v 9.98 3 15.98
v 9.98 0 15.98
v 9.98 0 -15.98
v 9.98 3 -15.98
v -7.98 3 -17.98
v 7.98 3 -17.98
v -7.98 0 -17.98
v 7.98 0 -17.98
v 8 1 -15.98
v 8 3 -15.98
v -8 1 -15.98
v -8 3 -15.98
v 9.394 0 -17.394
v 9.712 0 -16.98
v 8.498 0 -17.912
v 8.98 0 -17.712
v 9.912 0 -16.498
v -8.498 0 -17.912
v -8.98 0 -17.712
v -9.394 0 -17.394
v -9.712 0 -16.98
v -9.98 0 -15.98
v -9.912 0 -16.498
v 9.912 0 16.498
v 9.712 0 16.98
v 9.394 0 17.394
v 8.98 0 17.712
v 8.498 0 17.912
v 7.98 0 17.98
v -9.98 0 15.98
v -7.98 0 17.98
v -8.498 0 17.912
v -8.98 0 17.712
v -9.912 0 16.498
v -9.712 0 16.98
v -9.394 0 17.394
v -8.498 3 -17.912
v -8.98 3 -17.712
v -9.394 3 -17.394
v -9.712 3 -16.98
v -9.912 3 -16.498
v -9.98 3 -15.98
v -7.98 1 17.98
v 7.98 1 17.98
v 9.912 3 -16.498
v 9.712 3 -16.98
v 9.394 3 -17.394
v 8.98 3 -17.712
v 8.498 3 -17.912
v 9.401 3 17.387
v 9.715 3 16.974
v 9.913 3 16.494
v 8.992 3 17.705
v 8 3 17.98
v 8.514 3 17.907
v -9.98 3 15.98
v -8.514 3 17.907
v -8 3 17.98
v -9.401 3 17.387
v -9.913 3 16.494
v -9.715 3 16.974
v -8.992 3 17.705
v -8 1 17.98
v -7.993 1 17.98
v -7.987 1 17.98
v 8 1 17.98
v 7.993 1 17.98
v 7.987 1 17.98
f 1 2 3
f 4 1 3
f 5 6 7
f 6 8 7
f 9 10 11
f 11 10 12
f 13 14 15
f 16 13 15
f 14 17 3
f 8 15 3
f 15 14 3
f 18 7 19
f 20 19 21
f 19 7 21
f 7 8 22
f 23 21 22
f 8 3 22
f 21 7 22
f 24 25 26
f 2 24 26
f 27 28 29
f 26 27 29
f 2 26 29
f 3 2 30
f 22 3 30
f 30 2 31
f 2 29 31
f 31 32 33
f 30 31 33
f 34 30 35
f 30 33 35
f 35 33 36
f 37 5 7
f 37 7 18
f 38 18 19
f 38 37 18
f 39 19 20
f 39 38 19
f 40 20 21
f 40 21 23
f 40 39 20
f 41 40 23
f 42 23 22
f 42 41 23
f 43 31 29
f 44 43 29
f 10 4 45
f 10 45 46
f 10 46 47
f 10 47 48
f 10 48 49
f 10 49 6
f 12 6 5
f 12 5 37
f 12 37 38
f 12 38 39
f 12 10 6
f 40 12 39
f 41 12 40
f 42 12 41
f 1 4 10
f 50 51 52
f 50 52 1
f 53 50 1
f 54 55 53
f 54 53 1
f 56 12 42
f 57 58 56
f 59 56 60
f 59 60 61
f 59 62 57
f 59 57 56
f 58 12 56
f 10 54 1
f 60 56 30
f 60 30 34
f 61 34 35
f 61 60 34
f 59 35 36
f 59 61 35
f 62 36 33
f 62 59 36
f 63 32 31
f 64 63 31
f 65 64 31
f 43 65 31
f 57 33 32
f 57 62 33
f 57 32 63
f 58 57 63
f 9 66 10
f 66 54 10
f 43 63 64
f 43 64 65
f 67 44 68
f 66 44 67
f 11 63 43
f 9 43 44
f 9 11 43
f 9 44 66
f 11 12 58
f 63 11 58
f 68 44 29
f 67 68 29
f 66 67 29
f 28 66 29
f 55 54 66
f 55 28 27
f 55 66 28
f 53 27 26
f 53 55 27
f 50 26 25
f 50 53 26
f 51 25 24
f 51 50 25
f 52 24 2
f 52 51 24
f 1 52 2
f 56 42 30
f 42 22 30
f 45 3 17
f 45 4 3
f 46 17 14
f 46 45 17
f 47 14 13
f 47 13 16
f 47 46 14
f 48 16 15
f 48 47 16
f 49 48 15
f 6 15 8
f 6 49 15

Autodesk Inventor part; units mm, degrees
ref_plane "YZ Plane" through (0, 0, 0) normal (1, 0, 0) x (0, 1, 0)
ref_plane "XZ Plane" through (0, 0, 0) normal (0, 1, 0) x (-1, 0, 0)
ref_plane "XY Plane" through (0, 0, 0) normal (0, 0, 1) x (1, 0, 0)
sketch "Sketch1" plane through (0, 0, 0) normal (0, 1, 0) x (-1, 0, 0)
  line L0 (9.98, 17.98) -> (-9.98, 17.98)
  line L1 (-9.98, 17.98) -> (-9.98, -17.98)
  line L2 (-9.98, -17.98) -> (9.98, -17.98)
  line L3 (9.98, -17.98) -> (9.98, 17.98)
  line L4 (9.98, 17.98) -> (-9.98, -17.98) construction
  line L5 (-9.98, 17.98) -> (9.98, -17.98) construction
  point P0 (0, 0)
  dimension "d0" = 35.96
  dimension "d1" = 19.96
extrude "arm-wall" add sketch "Sketch1" along normal blind 3
sketch "Sketch2" plane through (0, 3, 0) normal (0, 1, 0) x (1, 0, 0)
  line L0 (-8, -17.98) -> (8, -17.98)
  line L1 (8, -17.98) -> (8, 15.98)
  line L2 (8, 15.98) -> (-8, 15.98)
  line L3 (-8, 15.98) -> (-8, -17.98)
  line L4 (-8, -17.98) -> (8, 15.98) construction
  line L5 (8, -17.98) -> (-8, 15.98) construction
  line L6 (0, 25.172) -> (0, -25.172) projected
  line L7 (9.98, 17.98) -> (-9.98, 17.98) projected
  line L8 (-9.98, -17.98) -> (9.98, -17.98) projected
  point P0 (0, 0)
  point P1 (0, -1)
  point P2 (0, -1)
  dimension "d4" = 16
  dimension "d5" = 2
extrude "slot" cut sketch "Sketch2" against normal blind 2
fillet "Fillet1" radius 2 1 edges at (-9.98, 1.5, 17.98)
fillet "Fillet2" radius 2 1 edges at (9.98, 1.5, 17.98)
fillet "Fillet3" radius 2 1 edges at (9.98, 1.5, -17.98)
fillet "Fillet4" radius 2 1 edges at (-9.98, 1.5, -17.98)
equation "\"d2\" = armthick"
equation "\"d4\" = adapterh"
equation "\"d5\" = -0.5 * adapterw + 0.5 * armw"
equation "\"d6\" = armslotd"
equation "\"d8\" = cornerrad"
equation "\"d9\" = cornerrad"
equation "\"d10\" = cornerrad"
equation "\"d11\" = cornerrad"
equation "\"printer3dtolerance\" = 0.12"
equation "\"wallw\" = 42"
equation "\"wallh\" = 44"
equation "\"cornerrad\" = 2"
equation "\"baseextra\" = 2"
equation "\"wall1_thick\" = 8"
equation "\"wall2_thick\" = 6.4"
equation "\"wall3_thick\" = 4"
equation "\"wall1slot\" = 8.12"
equation "\"wall2slot\" = 6.52"
equation "\"wall3slot\" = 4.12"
equation "\"gap2\" = 28"
equation "\"baseh\" = 79.12"
equation "\"basew\" = 44"
equation "\"base_thick\" = 6"
equation "\"base_slots_depth\" = 4"
equation "\"servobigcircledia\" = 11.62"
equation "\"servosmallcircledia\" = 5.92"
equation "\"servo9gw\" = 22.8"
equation "\"servomounth\" = 4"
equation "\"servomountsquare\" = 6"
equation "\"servopolygonr\" = 6.12"
equation "\"servopolygonl\" = 5.92"
equation "\"distancefrombottom\" = 34"
equation "\"distancefromleft\" = 26"
equation "\"wall3slotd\" = 2"
equation "\"wall3slotw\" = 36"
equation "\"adapterh\" = 16"
equation "\"adapterw\" = 32"
equation "\"armw\" = 36"
equation "\"armslotd\" = 2"
equation "\"armthick\" = 3"
properties part number "adapter-slot"
